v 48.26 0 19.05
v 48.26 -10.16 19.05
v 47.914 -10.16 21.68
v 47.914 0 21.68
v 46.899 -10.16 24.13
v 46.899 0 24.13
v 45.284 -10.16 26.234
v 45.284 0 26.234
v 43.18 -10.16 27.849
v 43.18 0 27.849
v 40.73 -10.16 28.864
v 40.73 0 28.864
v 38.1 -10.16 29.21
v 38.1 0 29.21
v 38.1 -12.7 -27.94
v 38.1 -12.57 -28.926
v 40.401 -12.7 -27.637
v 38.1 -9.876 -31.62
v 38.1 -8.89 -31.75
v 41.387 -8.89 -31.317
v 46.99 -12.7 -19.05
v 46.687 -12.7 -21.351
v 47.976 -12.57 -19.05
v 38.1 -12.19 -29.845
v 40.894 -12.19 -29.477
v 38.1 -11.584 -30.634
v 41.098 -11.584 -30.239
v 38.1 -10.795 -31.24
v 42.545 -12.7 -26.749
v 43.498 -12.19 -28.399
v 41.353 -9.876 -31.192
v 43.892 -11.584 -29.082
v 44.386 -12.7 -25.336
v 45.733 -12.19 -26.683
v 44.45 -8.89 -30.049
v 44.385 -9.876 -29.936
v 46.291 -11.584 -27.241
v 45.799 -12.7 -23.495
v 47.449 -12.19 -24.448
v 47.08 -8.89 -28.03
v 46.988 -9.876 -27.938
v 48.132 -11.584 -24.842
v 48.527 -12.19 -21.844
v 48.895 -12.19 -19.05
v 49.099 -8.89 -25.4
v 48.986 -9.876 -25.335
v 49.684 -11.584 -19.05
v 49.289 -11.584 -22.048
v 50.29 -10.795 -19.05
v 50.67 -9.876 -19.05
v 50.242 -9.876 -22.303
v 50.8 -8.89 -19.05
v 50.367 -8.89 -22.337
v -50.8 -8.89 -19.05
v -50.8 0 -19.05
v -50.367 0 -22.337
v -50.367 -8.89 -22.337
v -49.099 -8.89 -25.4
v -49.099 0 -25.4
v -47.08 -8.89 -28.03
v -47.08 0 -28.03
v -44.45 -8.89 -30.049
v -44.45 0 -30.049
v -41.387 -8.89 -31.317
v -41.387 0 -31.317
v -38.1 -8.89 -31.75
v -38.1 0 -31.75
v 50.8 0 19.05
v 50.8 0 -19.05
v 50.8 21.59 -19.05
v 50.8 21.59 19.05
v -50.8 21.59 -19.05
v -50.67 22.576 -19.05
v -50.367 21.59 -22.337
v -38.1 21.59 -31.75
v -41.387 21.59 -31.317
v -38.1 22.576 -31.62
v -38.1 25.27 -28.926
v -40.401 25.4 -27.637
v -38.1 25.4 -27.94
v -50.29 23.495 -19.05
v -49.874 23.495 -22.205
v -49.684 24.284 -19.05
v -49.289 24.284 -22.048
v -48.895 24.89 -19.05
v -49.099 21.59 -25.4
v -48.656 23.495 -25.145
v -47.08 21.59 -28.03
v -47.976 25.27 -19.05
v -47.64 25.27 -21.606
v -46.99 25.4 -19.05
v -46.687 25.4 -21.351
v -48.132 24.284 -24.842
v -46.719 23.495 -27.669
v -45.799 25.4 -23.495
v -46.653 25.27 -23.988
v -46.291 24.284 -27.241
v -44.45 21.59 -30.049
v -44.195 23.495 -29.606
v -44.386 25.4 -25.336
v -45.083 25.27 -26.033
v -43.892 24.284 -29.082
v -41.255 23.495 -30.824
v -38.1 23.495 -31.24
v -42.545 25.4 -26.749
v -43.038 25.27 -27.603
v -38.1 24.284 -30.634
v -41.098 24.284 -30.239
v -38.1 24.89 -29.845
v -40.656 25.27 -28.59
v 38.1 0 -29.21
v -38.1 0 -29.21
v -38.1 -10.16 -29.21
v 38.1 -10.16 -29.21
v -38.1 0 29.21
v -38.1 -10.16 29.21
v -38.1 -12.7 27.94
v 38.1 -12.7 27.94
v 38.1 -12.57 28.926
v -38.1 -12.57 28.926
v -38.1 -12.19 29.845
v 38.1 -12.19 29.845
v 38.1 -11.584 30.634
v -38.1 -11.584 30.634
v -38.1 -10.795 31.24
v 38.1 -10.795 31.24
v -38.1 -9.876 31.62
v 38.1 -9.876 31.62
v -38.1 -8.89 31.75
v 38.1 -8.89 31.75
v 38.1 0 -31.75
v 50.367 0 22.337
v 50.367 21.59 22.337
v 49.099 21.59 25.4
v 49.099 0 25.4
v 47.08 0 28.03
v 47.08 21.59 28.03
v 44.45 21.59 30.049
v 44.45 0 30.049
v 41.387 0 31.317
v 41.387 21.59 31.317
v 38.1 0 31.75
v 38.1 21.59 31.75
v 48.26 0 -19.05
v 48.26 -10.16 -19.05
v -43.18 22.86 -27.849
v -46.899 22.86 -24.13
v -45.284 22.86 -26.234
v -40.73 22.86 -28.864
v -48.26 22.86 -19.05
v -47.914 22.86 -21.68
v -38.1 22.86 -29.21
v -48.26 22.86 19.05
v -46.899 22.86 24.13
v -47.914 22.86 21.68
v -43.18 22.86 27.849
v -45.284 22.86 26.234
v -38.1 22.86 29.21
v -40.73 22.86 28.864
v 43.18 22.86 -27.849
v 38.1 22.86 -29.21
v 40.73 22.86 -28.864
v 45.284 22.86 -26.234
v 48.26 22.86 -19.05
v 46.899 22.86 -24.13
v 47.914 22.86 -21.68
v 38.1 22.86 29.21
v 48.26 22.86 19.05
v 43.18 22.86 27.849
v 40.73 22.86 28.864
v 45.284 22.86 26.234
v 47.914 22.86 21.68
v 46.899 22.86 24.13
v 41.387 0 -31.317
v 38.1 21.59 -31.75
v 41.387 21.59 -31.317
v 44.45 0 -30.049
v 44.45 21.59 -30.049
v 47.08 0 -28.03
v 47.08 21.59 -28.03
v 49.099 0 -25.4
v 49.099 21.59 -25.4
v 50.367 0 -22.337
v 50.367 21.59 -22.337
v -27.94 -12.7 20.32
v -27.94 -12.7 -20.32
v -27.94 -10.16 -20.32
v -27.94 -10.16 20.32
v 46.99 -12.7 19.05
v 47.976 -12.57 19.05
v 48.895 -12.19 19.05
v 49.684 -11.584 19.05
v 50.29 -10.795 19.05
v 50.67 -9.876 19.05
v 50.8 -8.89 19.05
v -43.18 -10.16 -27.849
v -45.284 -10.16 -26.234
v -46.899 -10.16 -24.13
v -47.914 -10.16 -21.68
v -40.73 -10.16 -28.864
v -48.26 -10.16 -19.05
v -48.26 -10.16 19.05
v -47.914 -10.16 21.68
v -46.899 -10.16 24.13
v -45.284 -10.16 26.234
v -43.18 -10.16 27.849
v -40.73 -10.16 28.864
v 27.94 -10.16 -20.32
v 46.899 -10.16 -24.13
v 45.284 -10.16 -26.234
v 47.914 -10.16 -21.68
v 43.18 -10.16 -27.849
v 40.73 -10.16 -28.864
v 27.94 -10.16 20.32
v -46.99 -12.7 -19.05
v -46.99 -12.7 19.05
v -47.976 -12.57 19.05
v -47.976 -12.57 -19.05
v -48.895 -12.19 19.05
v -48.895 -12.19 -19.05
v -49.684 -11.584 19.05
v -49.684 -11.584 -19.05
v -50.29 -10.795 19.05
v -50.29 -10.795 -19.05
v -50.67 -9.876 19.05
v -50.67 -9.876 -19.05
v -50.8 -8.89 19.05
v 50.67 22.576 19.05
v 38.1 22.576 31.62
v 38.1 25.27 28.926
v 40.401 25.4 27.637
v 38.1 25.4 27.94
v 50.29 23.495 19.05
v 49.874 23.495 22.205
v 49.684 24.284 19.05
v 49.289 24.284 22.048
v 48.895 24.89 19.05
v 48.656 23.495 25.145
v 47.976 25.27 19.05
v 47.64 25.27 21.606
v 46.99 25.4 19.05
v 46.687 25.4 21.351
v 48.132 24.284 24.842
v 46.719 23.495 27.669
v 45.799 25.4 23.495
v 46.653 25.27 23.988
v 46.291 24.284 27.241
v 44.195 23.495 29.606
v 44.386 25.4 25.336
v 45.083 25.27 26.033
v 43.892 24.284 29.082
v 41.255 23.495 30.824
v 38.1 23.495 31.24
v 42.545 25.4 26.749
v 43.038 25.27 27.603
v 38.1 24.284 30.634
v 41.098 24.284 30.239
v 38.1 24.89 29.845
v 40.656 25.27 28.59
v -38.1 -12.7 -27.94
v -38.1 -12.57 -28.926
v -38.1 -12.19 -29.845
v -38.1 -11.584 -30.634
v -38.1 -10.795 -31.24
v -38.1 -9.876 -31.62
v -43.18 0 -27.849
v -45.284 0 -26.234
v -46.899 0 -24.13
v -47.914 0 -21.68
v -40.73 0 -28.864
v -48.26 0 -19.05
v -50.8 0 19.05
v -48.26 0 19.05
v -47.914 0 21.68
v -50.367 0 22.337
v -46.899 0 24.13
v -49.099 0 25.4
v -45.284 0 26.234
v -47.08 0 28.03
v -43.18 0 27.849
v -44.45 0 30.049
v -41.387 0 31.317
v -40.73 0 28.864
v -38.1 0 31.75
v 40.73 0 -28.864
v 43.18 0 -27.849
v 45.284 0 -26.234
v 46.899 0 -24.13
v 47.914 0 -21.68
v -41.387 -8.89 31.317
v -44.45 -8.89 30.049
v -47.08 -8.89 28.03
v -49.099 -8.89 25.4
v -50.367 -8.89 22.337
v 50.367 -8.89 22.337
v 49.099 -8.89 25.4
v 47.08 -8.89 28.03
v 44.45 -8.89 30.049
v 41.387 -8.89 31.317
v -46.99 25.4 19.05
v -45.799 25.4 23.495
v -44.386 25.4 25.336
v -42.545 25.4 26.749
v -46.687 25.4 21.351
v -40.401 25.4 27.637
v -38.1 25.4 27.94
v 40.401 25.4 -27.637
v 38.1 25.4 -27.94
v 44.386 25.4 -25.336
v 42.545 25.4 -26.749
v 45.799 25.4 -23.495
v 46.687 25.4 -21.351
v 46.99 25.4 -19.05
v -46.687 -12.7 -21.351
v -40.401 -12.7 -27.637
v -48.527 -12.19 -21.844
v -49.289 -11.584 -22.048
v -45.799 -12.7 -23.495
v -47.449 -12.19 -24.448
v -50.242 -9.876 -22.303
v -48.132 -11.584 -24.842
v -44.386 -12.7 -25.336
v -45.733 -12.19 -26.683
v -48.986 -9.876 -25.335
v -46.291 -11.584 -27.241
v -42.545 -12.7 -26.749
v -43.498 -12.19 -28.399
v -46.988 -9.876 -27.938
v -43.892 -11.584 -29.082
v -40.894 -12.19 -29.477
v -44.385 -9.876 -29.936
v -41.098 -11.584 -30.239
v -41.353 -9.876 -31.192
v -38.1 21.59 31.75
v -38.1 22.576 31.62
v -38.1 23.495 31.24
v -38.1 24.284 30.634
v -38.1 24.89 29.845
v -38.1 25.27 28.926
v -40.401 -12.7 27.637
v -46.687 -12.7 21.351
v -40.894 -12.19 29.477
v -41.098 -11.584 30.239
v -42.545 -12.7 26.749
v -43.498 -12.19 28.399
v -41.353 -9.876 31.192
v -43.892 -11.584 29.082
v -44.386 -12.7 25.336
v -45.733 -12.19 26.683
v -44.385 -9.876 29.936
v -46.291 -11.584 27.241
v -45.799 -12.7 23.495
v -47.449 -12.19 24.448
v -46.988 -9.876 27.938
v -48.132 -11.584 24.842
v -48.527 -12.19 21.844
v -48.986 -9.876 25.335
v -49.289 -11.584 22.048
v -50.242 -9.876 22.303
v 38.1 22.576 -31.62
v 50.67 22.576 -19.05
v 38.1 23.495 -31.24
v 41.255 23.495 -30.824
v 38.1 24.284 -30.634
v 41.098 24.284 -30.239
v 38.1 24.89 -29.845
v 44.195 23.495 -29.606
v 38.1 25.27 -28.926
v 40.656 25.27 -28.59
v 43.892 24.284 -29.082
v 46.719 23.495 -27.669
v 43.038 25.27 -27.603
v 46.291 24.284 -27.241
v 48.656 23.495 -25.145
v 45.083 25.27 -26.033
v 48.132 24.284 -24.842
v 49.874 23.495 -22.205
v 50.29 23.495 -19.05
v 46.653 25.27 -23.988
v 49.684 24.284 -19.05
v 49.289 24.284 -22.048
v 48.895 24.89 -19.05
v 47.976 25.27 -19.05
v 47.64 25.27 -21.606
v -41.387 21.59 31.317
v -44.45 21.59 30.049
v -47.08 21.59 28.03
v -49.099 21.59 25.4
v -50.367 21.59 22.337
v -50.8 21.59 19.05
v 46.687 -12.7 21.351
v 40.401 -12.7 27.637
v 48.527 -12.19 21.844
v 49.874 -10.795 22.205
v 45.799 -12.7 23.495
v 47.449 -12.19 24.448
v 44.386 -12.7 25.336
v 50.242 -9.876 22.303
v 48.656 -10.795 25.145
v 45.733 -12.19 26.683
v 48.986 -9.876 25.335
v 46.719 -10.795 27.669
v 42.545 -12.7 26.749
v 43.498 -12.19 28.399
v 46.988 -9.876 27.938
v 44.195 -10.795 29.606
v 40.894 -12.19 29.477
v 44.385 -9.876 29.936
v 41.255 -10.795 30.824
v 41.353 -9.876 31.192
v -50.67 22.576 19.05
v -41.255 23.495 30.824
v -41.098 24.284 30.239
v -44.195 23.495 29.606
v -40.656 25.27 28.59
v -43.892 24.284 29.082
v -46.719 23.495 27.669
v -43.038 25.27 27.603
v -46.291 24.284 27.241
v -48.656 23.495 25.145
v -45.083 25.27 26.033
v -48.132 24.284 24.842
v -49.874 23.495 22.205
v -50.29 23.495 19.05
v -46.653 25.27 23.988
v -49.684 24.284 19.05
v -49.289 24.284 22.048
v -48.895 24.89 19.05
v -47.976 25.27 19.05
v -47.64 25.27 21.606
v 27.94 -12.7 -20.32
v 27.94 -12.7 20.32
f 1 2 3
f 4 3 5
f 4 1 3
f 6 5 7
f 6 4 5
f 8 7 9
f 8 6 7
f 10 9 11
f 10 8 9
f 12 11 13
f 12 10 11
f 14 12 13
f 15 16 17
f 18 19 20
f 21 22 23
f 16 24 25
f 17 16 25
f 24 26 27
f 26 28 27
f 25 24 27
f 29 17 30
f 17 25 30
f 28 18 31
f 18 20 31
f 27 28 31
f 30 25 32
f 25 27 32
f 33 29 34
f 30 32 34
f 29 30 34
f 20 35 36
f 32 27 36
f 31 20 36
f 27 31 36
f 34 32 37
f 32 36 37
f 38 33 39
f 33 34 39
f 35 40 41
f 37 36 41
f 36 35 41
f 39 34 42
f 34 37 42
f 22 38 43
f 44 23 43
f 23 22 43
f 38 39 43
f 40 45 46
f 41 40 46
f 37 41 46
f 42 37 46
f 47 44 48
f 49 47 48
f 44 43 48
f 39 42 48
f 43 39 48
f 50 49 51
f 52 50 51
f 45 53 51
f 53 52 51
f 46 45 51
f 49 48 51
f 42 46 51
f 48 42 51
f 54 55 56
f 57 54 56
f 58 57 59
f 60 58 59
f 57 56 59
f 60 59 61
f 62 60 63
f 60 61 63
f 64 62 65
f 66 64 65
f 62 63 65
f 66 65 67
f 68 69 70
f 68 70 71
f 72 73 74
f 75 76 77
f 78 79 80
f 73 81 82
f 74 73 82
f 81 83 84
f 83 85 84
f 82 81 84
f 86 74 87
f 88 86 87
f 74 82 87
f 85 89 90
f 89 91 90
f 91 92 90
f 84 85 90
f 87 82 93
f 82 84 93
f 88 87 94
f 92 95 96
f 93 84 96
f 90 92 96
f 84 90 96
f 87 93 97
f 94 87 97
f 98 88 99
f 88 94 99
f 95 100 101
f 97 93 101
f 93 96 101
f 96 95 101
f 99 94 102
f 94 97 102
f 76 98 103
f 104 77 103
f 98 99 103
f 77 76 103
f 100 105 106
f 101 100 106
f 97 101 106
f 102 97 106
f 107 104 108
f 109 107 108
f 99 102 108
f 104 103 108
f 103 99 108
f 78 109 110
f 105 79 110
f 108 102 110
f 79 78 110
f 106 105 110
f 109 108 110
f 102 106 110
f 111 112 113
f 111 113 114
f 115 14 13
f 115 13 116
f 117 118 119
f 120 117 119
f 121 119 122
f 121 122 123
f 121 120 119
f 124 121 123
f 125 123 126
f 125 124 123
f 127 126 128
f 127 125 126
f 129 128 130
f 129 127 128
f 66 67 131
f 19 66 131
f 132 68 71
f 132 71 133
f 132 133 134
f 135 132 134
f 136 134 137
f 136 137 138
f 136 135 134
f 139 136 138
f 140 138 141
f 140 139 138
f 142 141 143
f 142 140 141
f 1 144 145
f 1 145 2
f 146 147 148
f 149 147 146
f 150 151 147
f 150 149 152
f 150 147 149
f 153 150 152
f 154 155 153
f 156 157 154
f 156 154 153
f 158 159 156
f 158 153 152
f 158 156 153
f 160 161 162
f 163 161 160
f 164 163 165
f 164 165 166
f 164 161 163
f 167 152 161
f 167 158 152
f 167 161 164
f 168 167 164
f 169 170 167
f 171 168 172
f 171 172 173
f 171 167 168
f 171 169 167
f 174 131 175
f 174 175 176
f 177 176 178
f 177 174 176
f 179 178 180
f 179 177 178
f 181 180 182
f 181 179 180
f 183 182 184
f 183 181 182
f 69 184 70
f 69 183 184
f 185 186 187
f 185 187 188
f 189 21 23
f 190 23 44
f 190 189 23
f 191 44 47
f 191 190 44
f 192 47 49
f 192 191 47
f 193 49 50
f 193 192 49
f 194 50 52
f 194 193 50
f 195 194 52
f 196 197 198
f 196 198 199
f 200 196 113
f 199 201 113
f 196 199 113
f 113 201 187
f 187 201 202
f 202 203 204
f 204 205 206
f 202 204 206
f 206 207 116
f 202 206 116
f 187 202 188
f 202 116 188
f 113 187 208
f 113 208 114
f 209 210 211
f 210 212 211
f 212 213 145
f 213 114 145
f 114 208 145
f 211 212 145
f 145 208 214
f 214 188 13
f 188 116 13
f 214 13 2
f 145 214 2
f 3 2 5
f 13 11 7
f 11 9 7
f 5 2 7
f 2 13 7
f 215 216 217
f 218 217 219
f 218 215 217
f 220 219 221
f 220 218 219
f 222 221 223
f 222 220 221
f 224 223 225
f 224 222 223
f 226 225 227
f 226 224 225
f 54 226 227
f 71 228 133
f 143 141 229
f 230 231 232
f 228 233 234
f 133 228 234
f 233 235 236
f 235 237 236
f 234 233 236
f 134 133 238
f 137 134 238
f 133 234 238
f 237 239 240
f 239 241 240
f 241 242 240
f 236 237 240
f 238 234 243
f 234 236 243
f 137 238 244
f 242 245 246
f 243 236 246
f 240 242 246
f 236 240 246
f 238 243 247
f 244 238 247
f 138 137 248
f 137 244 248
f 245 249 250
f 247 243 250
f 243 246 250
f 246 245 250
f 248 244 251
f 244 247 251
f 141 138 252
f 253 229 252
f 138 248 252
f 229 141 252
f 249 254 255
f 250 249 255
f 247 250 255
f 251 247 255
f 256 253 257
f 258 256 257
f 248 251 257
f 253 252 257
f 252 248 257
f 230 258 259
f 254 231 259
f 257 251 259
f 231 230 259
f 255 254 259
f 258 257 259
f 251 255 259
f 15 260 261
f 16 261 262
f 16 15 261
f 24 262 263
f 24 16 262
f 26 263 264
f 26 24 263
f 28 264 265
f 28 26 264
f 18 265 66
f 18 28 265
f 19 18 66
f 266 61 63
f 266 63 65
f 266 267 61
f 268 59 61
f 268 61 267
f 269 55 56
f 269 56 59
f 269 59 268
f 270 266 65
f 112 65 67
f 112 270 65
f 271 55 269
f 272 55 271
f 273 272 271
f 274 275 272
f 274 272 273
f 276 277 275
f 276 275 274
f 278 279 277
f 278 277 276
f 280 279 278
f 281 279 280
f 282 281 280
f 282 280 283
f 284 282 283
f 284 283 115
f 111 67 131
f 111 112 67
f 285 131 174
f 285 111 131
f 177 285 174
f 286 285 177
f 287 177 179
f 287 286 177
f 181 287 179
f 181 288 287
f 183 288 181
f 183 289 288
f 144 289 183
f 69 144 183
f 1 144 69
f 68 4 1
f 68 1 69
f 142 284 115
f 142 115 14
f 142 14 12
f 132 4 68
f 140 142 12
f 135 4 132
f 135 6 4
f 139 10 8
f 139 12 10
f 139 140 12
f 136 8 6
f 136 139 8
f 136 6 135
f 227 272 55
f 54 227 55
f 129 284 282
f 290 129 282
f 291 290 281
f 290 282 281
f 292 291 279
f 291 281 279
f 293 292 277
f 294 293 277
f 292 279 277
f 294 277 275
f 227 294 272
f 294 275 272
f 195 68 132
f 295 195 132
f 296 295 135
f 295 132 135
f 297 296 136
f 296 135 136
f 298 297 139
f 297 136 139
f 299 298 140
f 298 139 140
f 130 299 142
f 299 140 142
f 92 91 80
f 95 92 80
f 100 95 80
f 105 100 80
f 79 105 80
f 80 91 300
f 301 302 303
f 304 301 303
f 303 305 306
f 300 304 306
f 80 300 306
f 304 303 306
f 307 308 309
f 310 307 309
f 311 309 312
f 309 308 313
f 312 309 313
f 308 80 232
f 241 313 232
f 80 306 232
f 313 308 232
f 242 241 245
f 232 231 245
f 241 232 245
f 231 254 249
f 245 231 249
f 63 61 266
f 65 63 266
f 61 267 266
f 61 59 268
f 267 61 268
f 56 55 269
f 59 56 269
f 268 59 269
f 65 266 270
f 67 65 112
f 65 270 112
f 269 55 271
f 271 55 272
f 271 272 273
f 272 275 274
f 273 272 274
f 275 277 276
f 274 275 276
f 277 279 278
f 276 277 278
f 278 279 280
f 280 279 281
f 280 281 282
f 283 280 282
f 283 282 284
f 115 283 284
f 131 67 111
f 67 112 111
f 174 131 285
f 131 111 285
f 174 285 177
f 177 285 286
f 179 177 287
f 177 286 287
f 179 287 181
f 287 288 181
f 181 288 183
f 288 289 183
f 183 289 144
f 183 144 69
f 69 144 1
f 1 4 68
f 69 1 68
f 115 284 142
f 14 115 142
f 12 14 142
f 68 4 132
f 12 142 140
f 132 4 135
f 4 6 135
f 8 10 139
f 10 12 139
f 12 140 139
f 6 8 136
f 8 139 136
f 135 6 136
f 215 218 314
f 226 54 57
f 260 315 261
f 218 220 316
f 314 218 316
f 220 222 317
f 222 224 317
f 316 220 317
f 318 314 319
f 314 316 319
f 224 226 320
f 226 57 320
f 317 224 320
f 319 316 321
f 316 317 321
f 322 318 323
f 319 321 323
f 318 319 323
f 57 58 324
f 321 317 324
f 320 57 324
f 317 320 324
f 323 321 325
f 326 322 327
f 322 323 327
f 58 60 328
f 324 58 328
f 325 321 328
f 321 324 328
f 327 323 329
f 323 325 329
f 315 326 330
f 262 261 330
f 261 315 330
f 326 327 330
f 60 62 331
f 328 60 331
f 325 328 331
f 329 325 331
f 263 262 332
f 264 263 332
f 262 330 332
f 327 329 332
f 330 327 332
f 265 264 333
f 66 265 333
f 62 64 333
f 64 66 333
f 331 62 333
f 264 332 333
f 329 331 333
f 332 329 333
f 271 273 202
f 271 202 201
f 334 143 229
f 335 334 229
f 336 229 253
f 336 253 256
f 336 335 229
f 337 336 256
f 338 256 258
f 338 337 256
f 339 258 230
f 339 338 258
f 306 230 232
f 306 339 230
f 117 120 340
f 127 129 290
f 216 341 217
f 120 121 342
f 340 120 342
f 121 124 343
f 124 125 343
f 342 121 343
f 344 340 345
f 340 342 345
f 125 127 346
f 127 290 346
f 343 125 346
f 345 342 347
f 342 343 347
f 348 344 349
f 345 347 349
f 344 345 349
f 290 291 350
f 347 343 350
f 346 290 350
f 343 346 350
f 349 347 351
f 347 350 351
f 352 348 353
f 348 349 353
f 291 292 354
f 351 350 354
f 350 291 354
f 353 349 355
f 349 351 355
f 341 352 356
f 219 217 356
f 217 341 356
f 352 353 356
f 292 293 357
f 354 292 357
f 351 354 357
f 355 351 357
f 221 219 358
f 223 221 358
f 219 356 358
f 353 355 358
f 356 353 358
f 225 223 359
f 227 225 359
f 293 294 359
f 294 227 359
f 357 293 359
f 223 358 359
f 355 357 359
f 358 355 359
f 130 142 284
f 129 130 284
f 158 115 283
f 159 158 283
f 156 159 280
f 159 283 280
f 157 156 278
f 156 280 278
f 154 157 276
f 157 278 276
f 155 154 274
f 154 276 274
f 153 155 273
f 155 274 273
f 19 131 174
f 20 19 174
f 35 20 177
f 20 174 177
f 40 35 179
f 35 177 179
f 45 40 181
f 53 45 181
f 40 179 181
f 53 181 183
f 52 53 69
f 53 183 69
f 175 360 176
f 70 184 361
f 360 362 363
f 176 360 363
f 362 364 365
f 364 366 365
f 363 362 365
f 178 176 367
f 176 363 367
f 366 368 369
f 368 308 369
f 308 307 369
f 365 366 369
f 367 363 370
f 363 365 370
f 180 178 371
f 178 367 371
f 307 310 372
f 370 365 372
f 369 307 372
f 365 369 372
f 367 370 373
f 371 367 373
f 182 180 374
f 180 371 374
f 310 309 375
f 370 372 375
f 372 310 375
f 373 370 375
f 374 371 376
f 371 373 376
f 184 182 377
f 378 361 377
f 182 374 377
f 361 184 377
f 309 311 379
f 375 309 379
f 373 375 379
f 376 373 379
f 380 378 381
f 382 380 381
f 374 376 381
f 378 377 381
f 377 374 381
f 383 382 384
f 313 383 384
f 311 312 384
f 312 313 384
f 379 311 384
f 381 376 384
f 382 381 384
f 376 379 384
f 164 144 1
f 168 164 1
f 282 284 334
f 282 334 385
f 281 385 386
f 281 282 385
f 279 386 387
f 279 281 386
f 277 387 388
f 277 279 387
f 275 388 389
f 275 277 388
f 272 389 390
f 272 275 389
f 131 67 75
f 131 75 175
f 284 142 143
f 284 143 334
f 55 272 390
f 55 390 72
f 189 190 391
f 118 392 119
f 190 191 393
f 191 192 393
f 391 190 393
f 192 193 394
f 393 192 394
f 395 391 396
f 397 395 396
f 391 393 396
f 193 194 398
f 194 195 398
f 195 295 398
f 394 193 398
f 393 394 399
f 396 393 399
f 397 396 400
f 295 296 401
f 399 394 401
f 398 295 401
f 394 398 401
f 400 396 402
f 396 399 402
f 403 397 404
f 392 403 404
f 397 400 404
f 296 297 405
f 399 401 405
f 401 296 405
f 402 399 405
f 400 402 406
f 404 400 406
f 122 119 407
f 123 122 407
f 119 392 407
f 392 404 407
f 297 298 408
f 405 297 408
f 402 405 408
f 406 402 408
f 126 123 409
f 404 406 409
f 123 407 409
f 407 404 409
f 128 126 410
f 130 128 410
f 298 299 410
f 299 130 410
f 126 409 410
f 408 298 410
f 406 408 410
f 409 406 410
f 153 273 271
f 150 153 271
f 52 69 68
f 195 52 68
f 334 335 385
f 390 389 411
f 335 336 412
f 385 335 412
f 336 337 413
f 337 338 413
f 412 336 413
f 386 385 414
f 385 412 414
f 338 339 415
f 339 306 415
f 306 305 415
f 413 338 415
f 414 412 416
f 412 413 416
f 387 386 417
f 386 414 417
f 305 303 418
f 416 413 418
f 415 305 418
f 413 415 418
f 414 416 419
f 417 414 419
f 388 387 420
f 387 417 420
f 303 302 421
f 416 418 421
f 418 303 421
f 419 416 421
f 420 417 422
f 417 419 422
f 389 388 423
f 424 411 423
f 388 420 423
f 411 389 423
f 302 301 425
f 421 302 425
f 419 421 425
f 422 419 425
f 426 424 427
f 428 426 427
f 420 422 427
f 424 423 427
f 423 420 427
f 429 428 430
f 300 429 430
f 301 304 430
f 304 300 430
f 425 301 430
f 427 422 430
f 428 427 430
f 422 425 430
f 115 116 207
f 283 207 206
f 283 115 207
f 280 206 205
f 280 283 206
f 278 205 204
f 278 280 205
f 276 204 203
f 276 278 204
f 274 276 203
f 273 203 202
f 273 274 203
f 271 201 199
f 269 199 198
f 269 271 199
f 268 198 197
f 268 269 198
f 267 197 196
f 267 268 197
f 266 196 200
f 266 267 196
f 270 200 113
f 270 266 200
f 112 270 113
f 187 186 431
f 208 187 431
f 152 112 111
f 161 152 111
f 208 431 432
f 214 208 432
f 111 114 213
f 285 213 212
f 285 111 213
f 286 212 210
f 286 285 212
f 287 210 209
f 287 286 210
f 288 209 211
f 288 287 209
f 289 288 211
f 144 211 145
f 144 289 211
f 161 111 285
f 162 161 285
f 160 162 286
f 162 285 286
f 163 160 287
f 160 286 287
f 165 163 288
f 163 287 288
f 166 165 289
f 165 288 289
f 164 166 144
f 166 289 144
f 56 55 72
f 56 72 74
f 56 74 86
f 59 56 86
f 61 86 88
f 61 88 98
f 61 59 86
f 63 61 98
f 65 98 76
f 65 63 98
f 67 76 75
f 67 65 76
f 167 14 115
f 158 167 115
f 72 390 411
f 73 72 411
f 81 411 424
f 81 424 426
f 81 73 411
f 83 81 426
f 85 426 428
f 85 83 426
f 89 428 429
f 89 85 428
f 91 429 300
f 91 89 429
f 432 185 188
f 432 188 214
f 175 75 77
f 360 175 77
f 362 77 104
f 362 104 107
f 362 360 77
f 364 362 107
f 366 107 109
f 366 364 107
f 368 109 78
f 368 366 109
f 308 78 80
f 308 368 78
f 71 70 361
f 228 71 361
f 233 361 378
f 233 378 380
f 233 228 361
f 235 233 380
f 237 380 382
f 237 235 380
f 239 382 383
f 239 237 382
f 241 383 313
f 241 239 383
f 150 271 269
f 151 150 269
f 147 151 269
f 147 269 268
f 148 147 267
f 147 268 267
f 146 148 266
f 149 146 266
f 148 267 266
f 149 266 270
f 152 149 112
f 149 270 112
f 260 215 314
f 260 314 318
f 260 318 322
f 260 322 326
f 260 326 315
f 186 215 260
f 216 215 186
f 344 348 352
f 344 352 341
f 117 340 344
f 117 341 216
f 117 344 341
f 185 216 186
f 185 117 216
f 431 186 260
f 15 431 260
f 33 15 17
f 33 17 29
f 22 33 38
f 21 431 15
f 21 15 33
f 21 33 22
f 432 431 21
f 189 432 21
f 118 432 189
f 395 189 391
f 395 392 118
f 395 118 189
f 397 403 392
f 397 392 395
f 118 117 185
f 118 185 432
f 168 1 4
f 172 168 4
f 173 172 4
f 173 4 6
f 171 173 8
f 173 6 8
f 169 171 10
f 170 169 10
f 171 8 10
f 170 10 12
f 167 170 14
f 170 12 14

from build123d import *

# Parameters (mm, degrees)
F1_DEPTH = 12.7
F3_DEPTH = 25.4
F4_T     = -2.54
F4_2_T   = -2.54
F2_W     = 55.88
F2_H     = 40.64
F5_DEPTH = 38.101
F6_R     = 3.81
F6_2_R   = 3.81


with BuildPart() as f1:
    # F0 (on Front) → F1 (new body)
    with BuildSketch(Plane.XZ):
        with BuildLine():
            Line((-38.1, -31.75), (38.1, -31.75))
            ThreePointArc((38.1, -31.75), (47.0802561211, -28.0302561211), (50.8, -19.05))
            Line((50.8, -19.05), (50.8, 19.05))
            ThreePointArc((50.8, 19.05), (47.0802561211, 28.0302561211), (38.1, 31.75))
            Line((38.1, 31.75), (-38.1, 31.75))
            ThreePointArc((-38.1, 31.75), (-47.0802561211, 28.0302561211), (-50.8, 19.05))
            Line((-50.8, 19.05), (-50.8, -19.05))
            ThreePointArc((-50.8, -19.05), (-47.0802561211, -28.0302561211), (-38.1, -31.75))
        make_face()
    extrude(amount=F1_DEPTH)

    # F4
    f4_openings = [f1.faces().sort_by_distance(p)[0] for p in [
        (0, 0, 0),
    ]]
    offset(amount=F4_T, openings=f4_openings)

    # F2 (on face) → F5 (cut, through all)
    with BuildSketch(Plane.XZ.offset(12.7)):
        Rectangle(F2_W, F2_H)
    extrude(amount=-F5_DEPTH, mode=Mode.SUBTRACT)

    # F6
    f6_edges = [f1.edges().sort_by_distance(p)[0] for p in [
        (0, -12.7, 31.75),
        (0, -12.7, -31.75),
        (-47.080256, -12.7, -28.030256),
        (47.080256, -12.7, -28.030256),
        (-50.8, -12.7, 0),
        (50.8, -12.7, 0),
        (-47.080256, -12.7, 28.030256),
        (47.080256, -12.7, 28.030256),
    ]]
    fillet(f6_edges, radius=F6_R)


with BuildPart() as f3:
    # F0 (on Front) → F3 (new body)
    with BuildSketch(Plane.XZ):
        with BuildLine():
            Line((-38.1, -31.75), (38.1, -31.75))
            ThreePointArc((38.1, -31.75), (47.0802561211, -28.0302561211), (50.8, -19.05))
            Line((50.8, -19.05), (50.8, 19.05))
            ThreePointArc((50.8, 19.05), (47.0802561211, 28.0302561211), (38.1, 31.75))
            Line((38.1, 31.75), (-38.1, 31.75))
            ThreePointArc((-38.1, 31.75), (-47.0802561211, 28.0302561211), (-50.8, 19.05))
            Line((-50.8, 19.05), (-50.8, -19.05))
            ThreePointArc((-50.8, -19.05), (-47.0802561211, -28.0302561211), (-38.1, -31.75))
        make_face()
    extrude(amount=-F3_DEPTH)

    # F4#2
    f4_2_openings = [f3.faces().sort_by_distance(p)[0] for p in [
        (0, 0, 0),
    ]]
    offset(amount=F4_2_T, openings=f4_2_openings)

    # F6#2
    f6_2_edges = [f3.edges().sort_by_distance(p)[0] for p in [
        (0, 25.4, 31.75),
        (0, 25.4, -31.75),
        (47.080256, 25.4, -28.030256),
        (50.8, 25.4, 0),
        (47.080256, 25.4, 28.030256),
        (-47.080256, 25.4, 28.030256),
        (-50.8, 25.4, 0),
        (-47.080256, 25.4, -28.030256),
    ]]
    fillet(f6_2_edges, radius=F6_2_R)


solid = Compound([f1.part, f3.part])
